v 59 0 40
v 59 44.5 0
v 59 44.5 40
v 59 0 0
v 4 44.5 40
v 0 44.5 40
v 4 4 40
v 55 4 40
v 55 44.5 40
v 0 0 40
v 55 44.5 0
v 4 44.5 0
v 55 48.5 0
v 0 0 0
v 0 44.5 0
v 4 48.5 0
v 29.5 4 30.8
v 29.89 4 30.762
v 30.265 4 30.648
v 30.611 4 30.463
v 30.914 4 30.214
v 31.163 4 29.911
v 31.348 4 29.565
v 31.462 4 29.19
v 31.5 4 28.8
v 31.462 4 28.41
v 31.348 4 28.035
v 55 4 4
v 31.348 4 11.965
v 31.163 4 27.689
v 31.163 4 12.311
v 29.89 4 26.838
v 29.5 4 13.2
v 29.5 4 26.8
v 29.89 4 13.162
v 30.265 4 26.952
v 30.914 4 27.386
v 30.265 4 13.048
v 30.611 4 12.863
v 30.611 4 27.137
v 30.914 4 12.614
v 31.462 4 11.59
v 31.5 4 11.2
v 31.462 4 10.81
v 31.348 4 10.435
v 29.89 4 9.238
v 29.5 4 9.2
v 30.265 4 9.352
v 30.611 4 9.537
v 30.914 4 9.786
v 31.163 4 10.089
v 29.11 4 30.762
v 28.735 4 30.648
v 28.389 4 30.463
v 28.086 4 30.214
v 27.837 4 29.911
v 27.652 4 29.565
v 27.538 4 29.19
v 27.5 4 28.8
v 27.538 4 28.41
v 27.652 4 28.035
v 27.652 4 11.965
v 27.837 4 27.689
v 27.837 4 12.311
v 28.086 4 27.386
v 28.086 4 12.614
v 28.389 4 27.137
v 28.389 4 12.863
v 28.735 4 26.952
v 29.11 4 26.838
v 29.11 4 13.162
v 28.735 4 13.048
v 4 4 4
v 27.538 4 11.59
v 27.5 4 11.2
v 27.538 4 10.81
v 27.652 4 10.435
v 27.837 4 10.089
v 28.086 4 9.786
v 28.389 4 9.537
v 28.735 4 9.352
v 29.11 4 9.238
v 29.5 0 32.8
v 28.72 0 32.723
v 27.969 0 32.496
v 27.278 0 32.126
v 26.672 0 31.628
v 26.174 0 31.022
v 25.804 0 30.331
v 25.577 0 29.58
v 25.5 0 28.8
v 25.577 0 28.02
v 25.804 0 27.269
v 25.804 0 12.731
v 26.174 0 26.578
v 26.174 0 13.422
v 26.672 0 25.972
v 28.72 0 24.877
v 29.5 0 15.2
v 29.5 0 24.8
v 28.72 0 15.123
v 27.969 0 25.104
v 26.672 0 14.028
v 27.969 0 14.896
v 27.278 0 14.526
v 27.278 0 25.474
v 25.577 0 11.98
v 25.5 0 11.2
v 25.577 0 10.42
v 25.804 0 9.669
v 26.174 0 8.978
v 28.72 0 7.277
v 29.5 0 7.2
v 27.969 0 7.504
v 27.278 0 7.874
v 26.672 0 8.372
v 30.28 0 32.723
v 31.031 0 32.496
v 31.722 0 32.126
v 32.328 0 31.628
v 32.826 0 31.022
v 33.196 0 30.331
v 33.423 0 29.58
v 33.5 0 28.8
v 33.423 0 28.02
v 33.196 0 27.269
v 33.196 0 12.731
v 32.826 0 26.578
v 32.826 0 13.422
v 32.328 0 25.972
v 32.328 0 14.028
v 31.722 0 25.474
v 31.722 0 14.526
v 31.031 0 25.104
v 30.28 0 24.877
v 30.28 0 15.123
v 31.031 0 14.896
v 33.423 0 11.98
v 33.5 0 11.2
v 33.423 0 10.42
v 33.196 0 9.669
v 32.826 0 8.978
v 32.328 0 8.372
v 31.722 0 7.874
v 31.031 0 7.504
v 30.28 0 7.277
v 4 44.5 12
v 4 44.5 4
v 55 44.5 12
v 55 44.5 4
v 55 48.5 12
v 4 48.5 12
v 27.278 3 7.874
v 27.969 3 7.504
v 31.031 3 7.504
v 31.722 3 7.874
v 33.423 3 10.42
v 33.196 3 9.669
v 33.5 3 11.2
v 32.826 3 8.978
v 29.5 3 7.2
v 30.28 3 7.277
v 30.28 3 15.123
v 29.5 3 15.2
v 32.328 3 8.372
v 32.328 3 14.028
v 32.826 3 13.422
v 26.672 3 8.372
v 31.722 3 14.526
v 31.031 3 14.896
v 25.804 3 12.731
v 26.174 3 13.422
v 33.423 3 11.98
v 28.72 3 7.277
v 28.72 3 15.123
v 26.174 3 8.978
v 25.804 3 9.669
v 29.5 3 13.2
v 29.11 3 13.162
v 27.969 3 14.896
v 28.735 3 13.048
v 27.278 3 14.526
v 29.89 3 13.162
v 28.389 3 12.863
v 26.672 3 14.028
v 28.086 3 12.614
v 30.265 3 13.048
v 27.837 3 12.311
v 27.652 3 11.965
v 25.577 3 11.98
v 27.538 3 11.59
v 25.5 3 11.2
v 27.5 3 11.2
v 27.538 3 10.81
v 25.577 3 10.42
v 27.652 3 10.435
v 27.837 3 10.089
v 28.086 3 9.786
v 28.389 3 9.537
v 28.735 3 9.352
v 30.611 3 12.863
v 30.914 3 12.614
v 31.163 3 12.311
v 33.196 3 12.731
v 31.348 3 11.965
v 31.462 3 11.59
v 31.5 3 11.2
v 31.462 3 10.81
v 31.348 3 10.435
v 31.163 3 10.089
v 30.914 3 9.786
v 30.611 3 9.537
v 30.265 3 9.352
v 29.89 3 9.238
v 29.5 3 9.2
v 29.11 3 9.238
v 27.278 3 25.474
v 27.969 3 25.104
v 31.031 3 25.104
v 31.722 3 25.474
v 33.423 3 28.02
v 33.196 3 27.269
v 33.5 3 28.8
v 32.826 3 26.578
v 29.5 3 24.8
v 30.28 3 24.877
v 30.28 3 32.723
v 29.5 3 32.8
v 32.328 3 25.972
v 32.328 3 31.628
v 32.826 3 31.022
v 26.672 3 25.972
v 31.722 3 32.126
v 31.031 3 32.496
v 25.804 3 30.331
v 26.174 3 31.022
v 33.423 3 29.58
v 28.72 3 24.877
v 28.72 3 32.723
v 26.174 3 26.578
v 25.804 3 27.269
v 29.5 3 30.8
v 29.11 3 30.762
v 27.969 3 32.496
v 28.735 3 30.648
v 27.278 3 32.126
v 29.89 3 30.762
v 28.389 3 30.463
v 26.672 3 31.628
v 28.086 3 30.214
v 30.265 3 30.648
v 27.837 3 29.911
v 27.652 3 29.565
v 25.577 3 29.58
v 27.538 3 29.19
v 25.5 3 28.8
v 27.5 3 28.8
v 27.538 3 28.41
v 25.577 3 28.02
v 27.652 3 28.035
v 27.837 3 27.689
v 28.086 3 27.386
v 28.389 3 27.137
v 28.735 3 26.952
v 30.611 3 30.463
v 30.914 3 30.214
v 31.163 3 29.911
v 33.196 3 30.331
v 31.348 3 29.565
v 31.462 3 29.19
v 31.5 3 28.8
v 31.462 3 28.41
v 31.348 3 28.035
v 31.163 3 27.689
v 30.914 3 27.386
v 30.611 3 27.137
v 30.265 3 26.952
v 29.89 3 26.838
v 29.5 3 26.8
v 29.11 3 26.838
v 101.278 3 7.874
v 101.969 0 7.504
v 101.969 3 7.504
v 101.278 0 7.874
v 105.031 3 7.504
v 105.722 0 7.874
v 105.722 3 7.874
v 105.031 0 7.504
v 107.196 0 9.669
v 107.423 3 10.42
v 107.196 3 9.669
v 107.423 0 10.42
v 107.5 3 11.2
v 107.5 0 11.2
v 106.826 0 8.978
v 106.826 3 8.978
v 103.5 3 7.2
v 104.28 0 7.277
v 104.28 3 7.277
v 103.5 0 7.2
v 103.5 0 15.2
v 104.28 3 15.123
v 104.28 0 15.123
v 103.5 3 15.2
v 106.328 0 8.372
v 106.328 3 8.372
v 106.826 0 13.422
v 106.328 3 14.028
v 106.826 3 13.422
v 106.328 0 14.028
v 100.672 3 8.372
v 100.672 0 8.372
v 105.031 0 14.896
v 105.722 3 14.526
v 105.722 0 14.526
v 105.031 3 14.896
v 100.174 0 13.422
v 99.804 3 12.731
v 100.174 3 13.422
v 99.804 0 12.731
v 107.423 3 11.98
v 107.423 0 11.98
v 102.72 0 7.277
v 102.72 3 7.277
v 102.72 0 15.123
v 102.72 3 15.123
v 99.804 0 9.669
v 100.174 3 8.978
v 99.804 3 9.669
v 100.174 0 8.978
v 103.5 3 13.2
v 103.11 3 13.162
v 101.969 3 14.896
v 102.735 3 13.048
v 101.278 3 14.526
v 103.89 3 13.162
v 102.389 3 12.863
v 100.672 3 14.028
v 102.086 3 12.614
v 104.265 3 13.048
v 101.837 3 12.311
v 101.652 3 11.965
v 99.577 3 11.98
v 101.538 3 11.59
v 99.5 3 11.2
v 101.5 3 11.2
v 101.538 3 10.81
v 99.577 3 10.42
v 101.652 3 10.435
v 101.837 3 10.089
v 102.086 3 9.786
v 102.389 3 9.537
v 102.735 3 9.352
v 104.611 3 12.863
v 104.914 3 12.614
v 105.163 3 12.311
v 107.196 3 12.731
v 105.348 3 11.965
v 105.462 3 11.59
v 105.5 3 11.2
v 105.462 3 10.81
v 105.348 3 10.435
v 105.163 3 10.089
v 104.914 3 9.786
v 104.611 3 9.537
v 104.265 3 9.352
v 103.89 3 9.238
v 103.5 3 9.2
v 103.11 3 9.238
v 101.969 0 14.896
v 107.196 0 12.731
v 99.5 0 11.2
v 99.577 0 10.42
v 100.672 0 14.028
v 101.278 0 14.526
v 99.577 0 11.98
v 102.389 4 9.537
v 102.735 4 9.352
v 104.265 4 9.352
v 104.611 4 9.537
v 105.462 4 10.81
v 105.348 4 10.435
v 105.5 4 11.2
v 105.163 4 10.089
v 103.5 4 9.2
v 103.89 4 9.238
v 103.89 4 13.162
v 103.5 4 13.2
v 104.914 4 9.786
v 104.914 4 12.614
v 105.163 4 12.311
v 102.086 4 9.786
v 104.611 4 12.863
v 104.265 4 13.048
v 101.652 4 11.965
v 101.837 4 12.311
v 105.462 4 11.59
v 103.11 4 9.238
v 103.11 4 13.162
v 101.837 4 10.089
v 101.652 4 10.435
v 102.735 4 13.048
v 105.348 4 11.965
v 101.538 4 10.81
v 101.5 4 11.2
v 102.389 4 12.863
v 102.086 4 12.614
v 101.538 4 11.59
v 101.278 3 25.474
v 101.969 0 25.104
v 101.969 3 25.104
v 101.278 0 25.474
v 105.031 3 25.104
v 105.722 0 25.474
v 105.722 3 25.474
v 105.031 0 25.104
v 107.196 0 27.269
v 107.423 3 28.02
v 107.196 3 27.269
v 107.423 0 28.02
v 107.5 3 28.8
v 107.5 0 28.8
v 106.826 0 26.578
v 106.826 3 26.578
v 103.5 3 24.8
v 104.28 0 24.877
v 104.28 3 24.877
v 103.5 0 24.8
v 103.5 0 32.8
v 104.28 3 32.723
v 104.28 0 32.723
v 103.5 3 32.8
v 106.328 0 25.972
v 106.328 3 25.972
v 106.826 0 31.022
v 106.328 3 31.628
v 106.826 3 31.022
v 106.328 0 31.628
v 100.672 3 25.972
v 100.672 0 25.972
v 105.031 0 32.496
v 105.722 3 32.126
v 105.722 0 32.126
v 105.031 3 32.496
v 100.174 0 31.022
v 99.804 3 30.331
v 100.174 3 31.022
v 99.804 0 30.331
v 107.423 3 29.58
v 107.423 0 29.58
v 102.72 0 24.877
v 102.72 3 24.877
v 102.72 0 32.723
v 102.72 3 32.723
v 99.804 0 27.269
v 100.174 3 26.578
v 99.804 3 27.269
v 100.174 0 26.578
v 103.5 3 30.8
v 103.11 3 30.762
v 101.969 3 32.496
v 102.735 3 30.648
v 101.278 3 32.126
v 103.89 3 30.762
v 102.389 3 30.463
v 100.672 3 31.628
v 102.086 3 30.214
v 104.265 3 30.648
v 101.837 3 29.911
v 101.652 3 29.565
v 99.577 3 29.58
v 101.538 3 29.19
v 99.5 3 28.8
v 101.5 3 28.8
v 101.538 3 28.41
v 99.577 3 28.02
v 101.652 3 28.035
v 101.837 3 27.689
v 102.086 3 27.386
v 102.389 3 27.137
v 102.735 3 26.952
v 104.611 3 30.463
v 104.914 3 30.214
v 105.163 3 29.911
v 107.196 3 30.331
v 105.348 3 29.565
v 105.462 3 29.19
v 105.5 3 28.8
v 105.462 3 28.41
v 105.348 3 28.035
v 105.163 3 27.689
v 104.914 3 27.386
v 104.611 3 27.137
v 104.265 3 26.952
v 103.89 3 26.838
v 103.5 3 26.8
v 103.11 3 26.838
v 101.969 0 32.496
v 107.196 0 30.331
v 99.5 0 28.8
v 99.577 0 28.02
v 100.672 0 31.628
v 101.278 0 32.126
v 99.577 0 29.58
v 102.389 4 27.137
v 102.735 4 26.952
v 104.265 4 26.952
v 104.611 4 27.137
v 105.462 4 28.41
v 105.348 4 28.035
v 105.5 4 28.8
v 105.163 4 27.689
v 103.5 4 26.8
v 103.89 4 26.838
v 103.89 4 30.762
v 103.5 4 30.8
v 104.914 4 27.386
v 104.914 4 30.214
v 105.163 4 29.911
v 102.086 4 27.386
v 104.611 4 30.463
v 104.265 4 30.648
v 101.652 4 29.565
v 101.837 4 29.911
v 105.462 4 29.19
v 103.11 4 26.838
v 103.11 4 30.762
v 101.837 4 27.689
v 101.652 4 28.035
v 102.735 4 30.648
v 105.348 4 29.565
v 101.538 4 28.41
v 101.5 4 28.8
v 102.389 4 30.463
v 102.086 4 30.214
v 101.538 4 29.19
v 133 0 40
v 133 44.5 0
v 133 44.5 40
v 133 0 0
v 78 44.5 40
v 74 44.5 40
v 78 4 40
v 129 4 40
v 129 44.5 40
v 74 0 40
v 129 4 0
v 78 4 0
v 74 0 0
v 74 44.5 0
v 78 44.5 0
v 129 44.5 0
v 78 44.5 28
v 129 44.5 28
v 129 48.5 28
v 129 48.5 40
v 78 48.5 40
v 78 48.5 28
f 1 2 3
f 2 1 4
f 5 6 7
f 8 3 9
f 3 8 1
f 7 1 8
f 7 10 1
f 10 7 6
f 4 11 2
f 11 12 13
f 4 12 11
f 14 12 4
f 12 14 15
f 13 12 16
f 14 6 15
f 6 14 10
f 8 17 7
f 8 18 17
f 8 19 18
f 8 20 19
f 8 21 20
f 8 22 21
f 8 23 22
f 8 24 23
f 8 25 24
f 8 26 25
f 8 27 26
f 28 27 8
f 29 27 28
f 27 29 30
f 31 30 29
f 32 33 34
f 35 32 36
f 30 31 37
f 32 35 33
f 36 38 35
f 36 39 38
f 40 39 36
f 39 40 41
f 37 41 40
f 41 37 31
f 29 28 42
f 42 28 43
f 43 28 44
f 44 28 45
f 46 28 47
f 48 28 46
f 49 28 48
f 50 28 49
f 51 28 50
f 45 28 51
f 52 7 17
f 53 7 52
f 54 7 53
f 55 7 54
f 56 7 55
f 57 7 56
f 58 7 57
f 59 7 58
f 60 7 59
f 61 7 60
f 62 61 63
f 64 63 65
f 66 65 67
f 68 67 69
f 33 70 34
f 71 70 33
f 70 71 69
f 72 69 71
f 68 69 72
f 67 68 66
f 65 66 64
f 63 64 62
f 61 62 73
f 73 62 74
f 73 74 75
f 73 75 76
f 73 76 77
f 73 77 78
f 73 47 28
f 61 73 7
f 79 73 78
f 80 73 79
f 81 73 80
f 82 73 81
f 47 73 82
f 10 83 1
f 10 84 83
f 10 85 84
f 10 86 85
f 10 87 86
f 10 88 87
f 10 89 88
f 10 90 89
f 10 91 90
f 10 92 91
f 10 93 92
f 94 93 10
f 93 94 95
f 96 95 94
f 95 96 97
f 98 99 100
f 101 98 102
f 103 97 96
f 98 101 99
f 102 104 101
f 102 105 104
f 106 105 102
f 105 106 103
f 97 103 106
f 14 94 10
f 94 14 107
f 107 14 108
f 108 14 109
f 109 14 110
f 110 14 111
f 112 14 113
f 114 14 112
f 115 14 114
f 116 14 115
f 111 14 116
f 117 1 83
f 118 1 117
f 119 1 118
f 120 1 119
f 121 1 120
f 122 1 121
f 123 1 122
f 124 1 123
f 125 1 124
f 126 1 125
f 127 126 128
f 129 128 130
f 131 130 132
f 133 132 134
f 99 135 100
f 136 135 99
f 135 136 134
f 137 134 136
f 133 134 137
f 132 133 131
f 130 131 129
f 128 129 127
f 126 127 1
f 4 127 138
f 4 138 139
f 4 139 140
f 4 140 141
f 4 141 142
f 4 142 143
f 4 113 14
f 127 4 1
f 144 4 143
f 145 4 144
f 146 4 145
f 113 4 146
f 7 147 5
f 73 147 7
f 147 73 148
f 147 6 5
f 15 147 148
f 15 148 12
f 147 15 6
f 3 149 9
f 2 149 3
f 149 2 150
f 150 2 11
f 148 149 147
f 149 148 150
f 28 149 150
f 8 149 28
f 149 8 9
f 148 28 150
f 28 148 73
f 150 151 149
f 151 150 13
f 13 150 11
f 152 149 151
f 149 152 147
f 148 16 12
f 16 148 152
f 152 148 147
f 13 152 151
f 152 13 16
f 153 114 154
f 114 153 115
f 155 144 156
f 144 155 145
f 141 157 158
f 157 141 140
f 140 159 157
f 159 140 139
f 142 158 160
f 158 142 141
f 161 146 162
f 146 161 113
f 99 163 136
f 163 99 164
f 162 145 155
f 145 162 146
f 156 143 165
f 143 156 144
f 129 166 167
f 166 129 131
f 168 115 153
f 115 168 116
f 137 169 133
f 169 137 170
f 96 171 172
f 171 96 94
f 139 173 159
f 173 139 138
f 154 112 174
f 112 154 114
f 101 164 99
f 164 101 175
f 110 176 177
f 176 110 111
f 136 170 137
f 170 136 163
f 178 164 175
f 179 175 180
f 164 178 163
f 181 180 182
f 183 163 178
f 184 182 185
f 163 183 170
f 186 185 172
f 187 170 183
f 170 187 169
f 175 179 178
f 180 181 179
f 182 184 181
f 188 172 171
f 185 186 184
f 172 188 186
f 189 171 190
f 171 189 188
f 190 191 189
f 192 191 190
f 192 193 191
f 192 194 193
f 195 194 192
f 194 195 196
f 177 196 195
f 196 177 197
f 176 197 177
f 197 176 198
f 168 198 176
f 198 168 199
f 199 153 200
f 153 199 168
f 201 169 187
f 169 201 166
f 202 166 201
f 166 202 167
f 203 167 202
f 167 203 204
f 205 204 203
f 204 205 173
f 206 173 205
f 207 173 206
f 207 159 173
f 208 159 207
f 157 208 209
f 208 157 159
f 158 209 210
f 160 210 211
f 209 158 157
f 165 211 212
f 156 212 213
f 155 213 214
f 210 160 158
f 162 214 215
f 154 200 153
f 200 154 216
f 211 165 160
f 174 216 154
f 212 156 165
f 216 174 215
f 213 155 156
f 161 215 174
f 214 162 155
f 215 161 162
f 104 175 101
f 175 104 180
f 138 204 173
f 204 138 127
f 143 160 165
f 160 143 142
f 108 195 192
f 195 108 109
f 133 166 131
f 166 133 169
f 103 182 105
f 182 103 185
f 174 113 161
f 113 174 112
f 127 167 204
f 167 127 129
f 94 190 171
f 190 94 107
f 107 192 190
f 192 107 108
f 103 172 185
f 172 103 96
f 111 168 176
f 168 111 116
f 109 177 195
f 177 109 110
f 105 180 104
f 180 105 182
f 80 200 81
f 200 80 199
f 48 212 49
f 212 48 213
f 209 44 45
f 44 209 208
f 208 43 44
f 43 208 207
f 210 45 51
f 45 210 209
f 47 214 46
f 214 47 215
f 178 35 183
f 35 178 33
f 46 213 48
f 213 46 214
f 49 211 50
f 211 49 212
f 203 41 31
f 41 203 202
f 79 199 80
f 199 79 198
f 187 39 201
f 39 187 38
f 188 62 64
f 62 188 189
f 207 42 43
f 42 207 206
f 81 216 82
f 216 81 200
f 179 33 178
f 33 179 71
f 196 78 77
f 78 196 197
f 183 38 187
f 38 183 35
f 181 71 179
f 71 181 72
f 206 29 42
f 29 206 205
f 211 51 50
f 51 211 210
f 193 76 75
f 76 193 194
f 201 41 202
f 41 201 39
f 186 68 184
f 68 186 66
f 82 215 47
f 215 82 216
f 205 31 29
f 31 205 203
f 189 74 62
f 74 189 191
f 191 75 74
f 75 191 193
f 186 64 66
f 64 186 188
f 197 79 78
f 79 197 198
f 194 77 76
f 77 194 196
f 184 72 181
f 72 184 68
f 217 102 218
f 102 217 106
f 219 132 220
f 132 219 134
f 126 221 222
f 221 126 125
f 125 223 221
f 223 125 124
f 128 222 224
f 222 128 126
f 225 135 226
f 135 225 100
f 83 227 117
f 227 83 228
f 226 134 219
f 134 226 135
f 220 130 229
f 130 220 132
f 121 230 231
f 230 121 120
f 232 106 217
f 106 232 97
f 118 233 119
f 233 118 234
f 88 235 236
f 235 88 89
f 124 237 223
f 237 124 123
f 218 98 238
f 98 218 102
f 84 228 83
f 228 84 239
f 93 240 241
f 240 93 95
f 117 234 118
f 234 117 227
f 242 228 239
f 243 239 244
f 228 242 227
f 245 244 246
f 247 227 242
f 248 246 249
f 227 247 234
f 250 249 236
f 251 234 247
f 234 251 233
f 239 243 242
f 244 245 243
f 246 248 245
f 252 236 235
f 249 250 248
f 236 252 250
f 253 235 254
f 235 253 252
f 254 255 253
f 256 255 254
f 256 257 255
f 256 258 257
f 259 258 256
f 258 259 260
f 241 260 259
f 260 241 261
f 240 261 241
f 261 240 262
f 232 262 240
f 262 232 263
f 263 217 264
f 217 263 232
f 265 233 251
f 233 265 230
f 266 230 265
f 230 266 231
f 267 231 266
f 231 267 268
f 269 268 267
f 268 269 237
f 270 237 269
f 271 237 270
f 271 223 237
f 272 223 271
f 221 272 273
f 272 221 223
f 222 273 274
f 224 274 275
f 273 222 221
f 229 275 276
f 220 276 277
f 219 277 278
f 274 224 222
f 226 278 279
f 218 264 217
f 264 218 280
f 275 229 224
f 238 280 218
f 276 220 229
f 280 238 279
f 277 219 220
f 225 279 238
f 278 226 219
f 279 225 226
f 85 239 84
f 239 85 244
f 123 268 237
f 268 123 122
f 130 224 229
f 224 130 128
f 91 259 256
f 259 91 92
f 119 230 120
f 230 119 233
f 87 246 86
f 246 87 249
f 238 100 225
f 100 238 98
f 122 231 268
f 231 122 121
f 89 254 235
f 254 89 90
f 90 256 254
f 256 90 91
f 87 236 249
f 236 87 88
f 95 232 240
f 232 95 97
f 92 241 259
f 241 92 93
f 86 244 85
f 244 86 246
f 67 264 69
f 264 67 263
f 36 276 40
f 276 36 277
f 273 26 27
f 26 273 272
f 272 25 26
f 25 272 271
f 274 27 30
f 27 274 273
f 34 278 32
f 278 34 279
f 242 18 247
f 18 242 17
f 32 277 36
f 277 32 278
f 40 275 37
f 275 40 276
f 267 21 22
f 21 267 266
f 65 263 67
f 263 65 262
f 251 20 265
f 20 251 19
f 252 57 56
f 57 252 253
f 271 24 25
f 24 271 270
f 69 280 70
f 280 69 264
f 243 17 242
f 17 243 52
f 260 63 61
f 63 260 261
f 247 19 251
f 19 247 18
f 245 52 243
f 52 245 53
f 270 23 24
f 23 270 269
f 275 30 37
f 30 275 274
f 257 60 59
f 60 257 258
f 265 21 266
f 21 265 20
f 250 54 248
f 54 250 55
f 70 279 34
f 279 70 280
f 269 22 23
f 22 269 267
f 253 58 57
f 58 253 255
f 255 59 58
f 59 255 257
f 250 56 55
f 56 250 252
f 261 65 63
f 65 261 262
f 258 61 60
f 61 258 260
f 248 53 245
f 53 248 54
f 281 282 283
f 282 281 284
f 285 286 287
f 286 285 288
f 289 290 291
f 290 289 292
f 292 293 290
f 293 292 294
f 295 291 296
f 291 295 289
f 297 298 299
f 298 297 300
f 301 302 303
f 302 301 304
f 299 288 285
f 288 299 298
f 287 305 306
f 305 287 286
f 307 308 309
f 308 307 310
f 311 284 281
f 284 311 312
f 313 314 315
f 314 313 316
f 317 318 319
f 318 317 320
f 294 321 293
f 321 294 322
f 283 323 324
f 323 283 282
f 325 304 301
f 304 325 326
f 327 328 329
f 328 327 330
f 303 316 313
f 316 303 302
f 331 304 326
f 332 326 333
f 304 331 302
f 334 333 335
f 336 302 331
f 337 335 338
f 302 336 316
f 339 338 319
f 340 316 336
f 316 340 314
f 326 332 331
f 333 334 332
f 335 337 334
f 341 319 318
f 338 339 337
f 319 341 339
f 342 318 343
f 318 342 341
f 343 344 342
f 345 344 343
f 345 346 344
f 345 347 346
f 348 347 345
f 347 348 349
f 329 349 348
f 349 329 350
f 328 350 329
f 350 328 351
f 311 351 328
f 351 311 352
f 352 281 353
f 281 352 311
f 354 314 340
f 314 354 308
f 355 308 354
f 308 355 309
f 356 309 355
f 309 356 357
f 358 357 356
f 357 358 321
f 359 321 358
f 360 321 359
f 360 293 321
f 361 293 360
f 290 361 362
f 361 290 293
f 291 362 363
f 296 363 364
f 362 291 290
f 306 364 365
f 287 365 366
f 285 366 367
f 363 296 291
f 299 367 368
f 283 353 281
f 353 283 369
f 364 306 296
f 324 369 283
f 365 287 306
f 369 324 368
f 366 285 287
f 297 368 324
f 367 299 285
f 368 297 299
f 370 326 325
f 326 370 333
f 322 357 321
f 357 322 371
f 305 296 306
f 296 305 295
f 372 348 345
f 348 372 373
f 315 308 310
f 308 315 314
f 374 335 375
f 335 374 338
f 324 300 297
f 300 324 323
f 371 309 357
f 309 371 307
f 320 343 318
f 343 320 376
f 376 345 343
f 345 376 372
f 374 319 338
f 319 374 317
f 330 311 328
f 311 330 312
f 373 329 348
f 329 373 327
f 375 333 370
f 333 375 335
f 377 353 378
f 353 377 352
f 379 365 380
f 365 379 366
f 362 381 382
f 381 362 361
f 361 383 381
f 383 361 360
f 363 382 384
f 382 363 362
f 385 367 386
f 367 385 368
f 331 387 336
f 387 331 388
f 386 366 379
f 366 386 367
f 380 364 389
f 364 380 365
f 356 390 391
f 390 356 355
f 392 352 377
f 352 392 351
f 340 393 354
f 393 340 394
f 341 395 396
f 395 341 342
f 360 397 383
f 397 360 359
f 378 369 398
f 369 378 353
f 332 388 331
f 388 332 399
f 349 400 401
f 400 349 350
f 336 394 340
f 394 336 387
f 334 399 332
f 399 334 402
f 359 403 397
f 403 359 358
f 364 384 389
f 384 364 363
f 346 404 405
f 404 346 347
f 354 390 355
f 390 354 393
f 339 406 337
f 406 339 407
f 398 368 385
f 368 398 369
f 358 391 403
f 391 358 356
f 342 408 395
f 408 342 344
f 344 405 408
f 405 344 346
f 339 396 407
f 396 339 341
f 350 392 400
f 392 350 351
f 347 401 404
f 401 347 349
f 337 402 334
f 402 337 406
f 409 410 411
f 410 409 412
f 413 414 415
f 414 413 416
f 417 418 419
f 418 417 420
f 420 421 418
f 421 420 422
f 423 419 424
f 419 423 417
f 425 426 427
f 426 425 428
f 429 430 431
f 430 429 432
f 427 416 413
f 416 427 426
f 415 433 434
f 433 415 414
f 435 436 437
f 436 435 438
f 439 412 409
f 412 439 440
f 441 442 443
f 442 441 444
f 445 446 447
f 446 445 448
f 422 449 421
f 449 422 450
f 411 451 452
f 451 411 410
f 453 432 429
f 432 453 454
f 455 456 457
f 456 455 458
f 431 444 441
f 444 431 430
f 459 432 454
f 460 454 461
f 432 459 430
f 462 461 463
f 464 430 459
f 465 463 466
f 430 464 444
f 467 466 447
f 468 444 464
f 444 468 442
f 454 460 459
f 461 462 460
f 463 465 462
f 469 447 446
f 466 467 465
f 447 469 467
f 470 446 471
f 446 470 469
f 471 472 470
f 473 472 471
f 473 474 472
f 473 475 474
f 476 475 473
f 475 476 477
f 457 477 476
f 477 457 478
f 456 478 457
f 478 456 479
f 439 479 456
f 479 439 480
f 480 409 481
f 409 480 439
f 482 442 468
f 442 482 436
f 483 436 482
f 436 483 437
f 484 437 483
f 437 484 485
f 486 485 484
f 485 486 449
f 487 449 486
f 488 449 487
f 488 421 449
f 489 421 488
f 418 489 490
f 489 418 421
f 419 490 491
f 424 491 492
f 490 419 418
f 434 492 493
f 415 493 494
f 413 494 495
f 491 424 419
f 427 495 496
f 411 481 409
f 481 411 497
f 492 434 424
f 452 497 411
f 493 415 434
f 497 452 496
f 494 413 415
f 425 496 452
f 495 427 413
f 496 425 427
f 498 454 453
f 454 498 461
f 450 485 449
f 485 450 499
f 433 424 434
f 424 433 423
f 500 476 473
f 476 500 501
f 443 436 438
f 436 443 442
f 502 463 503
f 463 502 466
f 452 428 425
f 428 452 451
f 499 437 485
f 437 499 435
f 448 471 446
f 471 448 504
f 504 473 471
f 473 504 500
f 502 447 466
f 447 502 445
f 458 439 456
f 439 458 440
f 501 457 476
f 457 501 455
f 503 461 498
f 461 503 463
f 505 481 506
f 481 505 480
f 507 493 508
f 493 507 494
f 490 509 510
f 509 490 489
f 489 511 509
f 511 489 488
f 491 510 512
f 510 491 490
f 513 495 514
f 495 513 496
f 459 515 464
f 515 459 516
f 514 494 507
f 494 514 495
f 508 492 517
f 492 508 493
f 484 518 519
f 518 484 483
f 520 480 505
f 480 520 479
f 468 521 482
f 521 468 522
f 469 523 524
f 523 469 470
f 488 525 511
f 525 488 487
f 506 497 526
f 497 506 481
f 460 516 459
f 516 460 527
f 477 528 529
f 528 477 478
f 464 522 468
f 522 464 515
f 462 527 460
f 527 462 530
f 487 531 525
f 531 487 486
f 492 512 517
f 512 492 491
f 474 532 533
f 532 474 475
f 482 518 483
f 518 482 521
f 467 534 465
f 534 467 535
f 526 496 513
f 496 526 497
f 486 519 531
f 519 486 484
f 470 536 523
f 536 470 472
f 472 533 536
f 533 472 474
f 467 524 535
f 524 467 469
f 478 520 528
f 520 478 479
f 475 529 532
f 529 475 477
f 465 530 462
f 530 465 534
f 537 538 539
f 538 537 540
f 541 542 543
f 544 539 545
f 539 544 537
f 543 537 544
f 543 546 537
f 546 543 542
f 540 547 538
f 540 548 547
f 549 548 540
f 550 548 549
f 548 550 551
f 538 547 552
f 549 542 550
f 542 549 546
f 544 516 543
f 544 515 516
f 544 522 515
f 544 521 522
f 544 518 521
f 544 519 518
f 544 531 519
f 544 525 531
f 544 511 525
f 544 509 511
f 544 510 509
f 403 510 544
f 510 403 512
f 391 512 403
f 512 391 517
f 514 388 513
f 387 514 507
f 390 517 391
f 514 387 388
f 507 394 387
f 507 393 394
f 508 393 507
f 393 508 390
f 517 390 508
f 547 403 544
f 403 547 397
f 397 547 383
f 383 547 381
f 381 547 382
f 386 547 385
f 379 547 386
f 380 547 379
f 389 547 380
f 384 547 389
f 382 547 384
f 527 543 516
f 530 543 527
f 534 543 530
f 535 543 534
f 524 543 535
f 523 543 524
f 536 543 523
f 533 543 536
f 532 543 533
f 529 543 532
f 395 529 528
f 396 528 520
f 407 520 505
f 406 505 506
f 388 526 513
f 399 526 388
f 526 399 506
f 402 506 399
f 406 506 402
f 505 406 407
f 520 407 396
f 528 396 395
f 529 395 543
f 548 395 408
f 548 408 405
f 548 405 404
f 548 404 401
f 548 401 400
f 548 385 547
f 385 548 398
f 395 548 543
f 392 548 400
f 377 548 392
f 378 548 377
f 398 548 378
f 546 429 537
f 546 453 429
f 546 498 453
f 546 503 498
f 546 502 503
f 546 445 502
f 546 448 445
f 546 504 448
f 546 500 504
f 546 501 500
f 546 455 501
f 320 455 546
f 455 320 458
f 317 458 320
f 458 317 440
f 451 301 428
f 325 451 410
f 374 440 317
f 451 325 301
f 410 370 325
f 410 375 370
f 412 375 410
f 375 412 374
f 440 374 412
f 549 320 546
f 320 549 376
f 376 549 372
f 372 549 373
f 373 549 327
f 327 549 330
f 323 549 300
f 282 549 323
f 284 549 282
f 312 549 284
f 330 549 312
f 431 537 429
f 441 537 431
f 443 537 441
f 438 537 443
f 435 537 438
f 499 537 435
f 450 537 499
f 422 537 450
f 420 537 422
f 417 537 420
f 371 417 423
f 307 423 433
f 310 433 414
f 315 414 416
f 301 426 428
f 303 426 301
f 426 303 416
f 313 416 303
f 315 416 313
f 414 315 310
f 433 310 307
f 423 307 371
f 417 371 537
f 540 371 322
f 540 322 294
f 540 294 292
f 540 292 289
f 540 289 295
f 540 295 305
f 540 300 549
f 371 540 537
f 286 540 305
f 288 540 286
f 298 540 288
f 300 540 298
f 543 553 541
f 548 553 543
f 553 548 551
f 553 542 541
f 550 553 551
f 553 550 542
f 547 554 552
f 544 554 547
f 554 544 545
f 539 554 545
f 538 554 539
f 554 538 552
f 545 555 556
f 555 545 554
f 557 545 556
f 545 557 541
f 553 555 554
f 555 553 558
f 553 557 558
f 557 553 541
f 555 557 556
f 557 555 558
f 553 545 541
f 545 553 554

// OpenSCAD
// ============================================================
// Power Strip Wall Mount Clips
// ============================================================
// Two-clip system for vertical wall mounting.
// Removal method: lift strip upward to disengage.
//
// Install:
//   1. Tilt top of strip toward wall, slide it up into the top clip.
//   2. Press the bottom against the wall and drop it onto the bottom clip floor.
// Remove:
//   1. Lift strip up until the bottom clears the bottom clip floor.
//   2. Tilt bottom of strip away from wall, slide strip down and out.
//
// Wall mounting:
//   - Mount TOP clip so its bottom edge is ~20 mm from the strip's top end.
//   - Mount BOTTOM clip so its top edge (floor) is ~20 mm from the strip's bottom end.
//   - Recommended vertical center-to-center spacing between clips: ~257 mm
//     (for a 317 mm strip with 20 mm clearance each end + 40 mm clip height)
// ============================================================

// --- Strip Dimensions (measured) ---
strip_w = 50;       // width across the outlet face (mm)
strip_d = 40;       // depth front-to-back (mm)
strip_l = 317;      // total length — reference only, not used in geometry

// --- Fit ---
tol = 0.5;          // clearance added per side so strip slides in easily

// --- Clip Geometry ---
wall_t = 4;         // wall thickness (mm)
clip_h = 40;        // height of each clip (mm)
lip_h  = 12;        // height of the front retaining lip (mm)

// --- Wall Screws (M4 countersunk) ---
screw_d      = 4.0;   // shank diameter
screw_head_d = 8.0;   // countersunk head diameter
screw_head_h = 3.0;   // countersunk recess depth

// --- Part to render ---
// "bottom"  — bottom clip only (has floor; strip rests on it)
// "top"     — top clip only   (open bottom; lip retains strip at top)
// "both"    — both clips side by side (default preview / layout for printing)
part = "both";

$fn = 32;

// --- Derived ---
iw = strip_w + 2*tol;   // inner channel width
id = strip_d + tol;     // inner channel depth (tolerance only on open/front side)
ow = iw + 2*wall_t;     // outer width

// ============================================================
module _screw_holes() {
    for (z = [clip_h * 0.28, clip_h * 0.72]) {
        translate([ow/2, -0.1, z])
        rotate([-90, 0, 0]) {
            cylinder(d=screw_head_d, h=screw_head_h + 0.1);   // countersink recess
            cylinder(d=screw_d,      h=wall_t + 0.2);          // through-hole
        }
    }
}

// Bottom clip — strip bottom end rests on the floor; front lip at the bottom
// prevents the strip from tipping away from the wall.
module bottom_clip() {
    difference() {
        union() {
            // Back plate (against wall)
            cube([ow, wall_t, clip_h]);
            // Left side wall
            translate([0, wall_t, 0])
                cube([wall_t, id, clip_h]);
            // Right side wall
            translate([ow - wall_t, wall_t, 0])
                cube([wall_t, id, clip_h]);
            // Floor — strip bottom end sits on this
            cube([ow, wall_t + id, wall_t]);
            // Front retaining lip at bottom
            translate([wall_t, wall_t + id, 0])
                cube([iw, wall_t, lip_h]);
        }
        _screw_holes();
    }
}

// Top clip — open at the bottom so the strip slides up in;
// front lip at the top keeps the strip from pulling away.
module top_clip() {
    difference() {
        union() {
            // Back plate (against wall)
            cube([ow, wall_t, clip_h]);
            // Left side wall
            translate([0, wall_t, 0])
                cube([wall_t, id, clip_h]);
            // Right side wall
            translate([ow - wall_t, wall_t, 0])
                cube([wall_t, id, clip_h]);
            // Front retaining lip at top
            translate([wall_t, wall_t + id, clip_h - lip_h])
                cube([iw, wall_t, lip_h]);
        }
        _screw_holes();
    }
}

// ============================================================
if (part == "bottom") {
    bottom_clip();
} else if (part == "top") {
    top_clip();
} else {
    // Both side by side for preview / single-plate print layout
    bottom_clip();
    translate([ow + 15, 0, 0])
        top_clip();
}
